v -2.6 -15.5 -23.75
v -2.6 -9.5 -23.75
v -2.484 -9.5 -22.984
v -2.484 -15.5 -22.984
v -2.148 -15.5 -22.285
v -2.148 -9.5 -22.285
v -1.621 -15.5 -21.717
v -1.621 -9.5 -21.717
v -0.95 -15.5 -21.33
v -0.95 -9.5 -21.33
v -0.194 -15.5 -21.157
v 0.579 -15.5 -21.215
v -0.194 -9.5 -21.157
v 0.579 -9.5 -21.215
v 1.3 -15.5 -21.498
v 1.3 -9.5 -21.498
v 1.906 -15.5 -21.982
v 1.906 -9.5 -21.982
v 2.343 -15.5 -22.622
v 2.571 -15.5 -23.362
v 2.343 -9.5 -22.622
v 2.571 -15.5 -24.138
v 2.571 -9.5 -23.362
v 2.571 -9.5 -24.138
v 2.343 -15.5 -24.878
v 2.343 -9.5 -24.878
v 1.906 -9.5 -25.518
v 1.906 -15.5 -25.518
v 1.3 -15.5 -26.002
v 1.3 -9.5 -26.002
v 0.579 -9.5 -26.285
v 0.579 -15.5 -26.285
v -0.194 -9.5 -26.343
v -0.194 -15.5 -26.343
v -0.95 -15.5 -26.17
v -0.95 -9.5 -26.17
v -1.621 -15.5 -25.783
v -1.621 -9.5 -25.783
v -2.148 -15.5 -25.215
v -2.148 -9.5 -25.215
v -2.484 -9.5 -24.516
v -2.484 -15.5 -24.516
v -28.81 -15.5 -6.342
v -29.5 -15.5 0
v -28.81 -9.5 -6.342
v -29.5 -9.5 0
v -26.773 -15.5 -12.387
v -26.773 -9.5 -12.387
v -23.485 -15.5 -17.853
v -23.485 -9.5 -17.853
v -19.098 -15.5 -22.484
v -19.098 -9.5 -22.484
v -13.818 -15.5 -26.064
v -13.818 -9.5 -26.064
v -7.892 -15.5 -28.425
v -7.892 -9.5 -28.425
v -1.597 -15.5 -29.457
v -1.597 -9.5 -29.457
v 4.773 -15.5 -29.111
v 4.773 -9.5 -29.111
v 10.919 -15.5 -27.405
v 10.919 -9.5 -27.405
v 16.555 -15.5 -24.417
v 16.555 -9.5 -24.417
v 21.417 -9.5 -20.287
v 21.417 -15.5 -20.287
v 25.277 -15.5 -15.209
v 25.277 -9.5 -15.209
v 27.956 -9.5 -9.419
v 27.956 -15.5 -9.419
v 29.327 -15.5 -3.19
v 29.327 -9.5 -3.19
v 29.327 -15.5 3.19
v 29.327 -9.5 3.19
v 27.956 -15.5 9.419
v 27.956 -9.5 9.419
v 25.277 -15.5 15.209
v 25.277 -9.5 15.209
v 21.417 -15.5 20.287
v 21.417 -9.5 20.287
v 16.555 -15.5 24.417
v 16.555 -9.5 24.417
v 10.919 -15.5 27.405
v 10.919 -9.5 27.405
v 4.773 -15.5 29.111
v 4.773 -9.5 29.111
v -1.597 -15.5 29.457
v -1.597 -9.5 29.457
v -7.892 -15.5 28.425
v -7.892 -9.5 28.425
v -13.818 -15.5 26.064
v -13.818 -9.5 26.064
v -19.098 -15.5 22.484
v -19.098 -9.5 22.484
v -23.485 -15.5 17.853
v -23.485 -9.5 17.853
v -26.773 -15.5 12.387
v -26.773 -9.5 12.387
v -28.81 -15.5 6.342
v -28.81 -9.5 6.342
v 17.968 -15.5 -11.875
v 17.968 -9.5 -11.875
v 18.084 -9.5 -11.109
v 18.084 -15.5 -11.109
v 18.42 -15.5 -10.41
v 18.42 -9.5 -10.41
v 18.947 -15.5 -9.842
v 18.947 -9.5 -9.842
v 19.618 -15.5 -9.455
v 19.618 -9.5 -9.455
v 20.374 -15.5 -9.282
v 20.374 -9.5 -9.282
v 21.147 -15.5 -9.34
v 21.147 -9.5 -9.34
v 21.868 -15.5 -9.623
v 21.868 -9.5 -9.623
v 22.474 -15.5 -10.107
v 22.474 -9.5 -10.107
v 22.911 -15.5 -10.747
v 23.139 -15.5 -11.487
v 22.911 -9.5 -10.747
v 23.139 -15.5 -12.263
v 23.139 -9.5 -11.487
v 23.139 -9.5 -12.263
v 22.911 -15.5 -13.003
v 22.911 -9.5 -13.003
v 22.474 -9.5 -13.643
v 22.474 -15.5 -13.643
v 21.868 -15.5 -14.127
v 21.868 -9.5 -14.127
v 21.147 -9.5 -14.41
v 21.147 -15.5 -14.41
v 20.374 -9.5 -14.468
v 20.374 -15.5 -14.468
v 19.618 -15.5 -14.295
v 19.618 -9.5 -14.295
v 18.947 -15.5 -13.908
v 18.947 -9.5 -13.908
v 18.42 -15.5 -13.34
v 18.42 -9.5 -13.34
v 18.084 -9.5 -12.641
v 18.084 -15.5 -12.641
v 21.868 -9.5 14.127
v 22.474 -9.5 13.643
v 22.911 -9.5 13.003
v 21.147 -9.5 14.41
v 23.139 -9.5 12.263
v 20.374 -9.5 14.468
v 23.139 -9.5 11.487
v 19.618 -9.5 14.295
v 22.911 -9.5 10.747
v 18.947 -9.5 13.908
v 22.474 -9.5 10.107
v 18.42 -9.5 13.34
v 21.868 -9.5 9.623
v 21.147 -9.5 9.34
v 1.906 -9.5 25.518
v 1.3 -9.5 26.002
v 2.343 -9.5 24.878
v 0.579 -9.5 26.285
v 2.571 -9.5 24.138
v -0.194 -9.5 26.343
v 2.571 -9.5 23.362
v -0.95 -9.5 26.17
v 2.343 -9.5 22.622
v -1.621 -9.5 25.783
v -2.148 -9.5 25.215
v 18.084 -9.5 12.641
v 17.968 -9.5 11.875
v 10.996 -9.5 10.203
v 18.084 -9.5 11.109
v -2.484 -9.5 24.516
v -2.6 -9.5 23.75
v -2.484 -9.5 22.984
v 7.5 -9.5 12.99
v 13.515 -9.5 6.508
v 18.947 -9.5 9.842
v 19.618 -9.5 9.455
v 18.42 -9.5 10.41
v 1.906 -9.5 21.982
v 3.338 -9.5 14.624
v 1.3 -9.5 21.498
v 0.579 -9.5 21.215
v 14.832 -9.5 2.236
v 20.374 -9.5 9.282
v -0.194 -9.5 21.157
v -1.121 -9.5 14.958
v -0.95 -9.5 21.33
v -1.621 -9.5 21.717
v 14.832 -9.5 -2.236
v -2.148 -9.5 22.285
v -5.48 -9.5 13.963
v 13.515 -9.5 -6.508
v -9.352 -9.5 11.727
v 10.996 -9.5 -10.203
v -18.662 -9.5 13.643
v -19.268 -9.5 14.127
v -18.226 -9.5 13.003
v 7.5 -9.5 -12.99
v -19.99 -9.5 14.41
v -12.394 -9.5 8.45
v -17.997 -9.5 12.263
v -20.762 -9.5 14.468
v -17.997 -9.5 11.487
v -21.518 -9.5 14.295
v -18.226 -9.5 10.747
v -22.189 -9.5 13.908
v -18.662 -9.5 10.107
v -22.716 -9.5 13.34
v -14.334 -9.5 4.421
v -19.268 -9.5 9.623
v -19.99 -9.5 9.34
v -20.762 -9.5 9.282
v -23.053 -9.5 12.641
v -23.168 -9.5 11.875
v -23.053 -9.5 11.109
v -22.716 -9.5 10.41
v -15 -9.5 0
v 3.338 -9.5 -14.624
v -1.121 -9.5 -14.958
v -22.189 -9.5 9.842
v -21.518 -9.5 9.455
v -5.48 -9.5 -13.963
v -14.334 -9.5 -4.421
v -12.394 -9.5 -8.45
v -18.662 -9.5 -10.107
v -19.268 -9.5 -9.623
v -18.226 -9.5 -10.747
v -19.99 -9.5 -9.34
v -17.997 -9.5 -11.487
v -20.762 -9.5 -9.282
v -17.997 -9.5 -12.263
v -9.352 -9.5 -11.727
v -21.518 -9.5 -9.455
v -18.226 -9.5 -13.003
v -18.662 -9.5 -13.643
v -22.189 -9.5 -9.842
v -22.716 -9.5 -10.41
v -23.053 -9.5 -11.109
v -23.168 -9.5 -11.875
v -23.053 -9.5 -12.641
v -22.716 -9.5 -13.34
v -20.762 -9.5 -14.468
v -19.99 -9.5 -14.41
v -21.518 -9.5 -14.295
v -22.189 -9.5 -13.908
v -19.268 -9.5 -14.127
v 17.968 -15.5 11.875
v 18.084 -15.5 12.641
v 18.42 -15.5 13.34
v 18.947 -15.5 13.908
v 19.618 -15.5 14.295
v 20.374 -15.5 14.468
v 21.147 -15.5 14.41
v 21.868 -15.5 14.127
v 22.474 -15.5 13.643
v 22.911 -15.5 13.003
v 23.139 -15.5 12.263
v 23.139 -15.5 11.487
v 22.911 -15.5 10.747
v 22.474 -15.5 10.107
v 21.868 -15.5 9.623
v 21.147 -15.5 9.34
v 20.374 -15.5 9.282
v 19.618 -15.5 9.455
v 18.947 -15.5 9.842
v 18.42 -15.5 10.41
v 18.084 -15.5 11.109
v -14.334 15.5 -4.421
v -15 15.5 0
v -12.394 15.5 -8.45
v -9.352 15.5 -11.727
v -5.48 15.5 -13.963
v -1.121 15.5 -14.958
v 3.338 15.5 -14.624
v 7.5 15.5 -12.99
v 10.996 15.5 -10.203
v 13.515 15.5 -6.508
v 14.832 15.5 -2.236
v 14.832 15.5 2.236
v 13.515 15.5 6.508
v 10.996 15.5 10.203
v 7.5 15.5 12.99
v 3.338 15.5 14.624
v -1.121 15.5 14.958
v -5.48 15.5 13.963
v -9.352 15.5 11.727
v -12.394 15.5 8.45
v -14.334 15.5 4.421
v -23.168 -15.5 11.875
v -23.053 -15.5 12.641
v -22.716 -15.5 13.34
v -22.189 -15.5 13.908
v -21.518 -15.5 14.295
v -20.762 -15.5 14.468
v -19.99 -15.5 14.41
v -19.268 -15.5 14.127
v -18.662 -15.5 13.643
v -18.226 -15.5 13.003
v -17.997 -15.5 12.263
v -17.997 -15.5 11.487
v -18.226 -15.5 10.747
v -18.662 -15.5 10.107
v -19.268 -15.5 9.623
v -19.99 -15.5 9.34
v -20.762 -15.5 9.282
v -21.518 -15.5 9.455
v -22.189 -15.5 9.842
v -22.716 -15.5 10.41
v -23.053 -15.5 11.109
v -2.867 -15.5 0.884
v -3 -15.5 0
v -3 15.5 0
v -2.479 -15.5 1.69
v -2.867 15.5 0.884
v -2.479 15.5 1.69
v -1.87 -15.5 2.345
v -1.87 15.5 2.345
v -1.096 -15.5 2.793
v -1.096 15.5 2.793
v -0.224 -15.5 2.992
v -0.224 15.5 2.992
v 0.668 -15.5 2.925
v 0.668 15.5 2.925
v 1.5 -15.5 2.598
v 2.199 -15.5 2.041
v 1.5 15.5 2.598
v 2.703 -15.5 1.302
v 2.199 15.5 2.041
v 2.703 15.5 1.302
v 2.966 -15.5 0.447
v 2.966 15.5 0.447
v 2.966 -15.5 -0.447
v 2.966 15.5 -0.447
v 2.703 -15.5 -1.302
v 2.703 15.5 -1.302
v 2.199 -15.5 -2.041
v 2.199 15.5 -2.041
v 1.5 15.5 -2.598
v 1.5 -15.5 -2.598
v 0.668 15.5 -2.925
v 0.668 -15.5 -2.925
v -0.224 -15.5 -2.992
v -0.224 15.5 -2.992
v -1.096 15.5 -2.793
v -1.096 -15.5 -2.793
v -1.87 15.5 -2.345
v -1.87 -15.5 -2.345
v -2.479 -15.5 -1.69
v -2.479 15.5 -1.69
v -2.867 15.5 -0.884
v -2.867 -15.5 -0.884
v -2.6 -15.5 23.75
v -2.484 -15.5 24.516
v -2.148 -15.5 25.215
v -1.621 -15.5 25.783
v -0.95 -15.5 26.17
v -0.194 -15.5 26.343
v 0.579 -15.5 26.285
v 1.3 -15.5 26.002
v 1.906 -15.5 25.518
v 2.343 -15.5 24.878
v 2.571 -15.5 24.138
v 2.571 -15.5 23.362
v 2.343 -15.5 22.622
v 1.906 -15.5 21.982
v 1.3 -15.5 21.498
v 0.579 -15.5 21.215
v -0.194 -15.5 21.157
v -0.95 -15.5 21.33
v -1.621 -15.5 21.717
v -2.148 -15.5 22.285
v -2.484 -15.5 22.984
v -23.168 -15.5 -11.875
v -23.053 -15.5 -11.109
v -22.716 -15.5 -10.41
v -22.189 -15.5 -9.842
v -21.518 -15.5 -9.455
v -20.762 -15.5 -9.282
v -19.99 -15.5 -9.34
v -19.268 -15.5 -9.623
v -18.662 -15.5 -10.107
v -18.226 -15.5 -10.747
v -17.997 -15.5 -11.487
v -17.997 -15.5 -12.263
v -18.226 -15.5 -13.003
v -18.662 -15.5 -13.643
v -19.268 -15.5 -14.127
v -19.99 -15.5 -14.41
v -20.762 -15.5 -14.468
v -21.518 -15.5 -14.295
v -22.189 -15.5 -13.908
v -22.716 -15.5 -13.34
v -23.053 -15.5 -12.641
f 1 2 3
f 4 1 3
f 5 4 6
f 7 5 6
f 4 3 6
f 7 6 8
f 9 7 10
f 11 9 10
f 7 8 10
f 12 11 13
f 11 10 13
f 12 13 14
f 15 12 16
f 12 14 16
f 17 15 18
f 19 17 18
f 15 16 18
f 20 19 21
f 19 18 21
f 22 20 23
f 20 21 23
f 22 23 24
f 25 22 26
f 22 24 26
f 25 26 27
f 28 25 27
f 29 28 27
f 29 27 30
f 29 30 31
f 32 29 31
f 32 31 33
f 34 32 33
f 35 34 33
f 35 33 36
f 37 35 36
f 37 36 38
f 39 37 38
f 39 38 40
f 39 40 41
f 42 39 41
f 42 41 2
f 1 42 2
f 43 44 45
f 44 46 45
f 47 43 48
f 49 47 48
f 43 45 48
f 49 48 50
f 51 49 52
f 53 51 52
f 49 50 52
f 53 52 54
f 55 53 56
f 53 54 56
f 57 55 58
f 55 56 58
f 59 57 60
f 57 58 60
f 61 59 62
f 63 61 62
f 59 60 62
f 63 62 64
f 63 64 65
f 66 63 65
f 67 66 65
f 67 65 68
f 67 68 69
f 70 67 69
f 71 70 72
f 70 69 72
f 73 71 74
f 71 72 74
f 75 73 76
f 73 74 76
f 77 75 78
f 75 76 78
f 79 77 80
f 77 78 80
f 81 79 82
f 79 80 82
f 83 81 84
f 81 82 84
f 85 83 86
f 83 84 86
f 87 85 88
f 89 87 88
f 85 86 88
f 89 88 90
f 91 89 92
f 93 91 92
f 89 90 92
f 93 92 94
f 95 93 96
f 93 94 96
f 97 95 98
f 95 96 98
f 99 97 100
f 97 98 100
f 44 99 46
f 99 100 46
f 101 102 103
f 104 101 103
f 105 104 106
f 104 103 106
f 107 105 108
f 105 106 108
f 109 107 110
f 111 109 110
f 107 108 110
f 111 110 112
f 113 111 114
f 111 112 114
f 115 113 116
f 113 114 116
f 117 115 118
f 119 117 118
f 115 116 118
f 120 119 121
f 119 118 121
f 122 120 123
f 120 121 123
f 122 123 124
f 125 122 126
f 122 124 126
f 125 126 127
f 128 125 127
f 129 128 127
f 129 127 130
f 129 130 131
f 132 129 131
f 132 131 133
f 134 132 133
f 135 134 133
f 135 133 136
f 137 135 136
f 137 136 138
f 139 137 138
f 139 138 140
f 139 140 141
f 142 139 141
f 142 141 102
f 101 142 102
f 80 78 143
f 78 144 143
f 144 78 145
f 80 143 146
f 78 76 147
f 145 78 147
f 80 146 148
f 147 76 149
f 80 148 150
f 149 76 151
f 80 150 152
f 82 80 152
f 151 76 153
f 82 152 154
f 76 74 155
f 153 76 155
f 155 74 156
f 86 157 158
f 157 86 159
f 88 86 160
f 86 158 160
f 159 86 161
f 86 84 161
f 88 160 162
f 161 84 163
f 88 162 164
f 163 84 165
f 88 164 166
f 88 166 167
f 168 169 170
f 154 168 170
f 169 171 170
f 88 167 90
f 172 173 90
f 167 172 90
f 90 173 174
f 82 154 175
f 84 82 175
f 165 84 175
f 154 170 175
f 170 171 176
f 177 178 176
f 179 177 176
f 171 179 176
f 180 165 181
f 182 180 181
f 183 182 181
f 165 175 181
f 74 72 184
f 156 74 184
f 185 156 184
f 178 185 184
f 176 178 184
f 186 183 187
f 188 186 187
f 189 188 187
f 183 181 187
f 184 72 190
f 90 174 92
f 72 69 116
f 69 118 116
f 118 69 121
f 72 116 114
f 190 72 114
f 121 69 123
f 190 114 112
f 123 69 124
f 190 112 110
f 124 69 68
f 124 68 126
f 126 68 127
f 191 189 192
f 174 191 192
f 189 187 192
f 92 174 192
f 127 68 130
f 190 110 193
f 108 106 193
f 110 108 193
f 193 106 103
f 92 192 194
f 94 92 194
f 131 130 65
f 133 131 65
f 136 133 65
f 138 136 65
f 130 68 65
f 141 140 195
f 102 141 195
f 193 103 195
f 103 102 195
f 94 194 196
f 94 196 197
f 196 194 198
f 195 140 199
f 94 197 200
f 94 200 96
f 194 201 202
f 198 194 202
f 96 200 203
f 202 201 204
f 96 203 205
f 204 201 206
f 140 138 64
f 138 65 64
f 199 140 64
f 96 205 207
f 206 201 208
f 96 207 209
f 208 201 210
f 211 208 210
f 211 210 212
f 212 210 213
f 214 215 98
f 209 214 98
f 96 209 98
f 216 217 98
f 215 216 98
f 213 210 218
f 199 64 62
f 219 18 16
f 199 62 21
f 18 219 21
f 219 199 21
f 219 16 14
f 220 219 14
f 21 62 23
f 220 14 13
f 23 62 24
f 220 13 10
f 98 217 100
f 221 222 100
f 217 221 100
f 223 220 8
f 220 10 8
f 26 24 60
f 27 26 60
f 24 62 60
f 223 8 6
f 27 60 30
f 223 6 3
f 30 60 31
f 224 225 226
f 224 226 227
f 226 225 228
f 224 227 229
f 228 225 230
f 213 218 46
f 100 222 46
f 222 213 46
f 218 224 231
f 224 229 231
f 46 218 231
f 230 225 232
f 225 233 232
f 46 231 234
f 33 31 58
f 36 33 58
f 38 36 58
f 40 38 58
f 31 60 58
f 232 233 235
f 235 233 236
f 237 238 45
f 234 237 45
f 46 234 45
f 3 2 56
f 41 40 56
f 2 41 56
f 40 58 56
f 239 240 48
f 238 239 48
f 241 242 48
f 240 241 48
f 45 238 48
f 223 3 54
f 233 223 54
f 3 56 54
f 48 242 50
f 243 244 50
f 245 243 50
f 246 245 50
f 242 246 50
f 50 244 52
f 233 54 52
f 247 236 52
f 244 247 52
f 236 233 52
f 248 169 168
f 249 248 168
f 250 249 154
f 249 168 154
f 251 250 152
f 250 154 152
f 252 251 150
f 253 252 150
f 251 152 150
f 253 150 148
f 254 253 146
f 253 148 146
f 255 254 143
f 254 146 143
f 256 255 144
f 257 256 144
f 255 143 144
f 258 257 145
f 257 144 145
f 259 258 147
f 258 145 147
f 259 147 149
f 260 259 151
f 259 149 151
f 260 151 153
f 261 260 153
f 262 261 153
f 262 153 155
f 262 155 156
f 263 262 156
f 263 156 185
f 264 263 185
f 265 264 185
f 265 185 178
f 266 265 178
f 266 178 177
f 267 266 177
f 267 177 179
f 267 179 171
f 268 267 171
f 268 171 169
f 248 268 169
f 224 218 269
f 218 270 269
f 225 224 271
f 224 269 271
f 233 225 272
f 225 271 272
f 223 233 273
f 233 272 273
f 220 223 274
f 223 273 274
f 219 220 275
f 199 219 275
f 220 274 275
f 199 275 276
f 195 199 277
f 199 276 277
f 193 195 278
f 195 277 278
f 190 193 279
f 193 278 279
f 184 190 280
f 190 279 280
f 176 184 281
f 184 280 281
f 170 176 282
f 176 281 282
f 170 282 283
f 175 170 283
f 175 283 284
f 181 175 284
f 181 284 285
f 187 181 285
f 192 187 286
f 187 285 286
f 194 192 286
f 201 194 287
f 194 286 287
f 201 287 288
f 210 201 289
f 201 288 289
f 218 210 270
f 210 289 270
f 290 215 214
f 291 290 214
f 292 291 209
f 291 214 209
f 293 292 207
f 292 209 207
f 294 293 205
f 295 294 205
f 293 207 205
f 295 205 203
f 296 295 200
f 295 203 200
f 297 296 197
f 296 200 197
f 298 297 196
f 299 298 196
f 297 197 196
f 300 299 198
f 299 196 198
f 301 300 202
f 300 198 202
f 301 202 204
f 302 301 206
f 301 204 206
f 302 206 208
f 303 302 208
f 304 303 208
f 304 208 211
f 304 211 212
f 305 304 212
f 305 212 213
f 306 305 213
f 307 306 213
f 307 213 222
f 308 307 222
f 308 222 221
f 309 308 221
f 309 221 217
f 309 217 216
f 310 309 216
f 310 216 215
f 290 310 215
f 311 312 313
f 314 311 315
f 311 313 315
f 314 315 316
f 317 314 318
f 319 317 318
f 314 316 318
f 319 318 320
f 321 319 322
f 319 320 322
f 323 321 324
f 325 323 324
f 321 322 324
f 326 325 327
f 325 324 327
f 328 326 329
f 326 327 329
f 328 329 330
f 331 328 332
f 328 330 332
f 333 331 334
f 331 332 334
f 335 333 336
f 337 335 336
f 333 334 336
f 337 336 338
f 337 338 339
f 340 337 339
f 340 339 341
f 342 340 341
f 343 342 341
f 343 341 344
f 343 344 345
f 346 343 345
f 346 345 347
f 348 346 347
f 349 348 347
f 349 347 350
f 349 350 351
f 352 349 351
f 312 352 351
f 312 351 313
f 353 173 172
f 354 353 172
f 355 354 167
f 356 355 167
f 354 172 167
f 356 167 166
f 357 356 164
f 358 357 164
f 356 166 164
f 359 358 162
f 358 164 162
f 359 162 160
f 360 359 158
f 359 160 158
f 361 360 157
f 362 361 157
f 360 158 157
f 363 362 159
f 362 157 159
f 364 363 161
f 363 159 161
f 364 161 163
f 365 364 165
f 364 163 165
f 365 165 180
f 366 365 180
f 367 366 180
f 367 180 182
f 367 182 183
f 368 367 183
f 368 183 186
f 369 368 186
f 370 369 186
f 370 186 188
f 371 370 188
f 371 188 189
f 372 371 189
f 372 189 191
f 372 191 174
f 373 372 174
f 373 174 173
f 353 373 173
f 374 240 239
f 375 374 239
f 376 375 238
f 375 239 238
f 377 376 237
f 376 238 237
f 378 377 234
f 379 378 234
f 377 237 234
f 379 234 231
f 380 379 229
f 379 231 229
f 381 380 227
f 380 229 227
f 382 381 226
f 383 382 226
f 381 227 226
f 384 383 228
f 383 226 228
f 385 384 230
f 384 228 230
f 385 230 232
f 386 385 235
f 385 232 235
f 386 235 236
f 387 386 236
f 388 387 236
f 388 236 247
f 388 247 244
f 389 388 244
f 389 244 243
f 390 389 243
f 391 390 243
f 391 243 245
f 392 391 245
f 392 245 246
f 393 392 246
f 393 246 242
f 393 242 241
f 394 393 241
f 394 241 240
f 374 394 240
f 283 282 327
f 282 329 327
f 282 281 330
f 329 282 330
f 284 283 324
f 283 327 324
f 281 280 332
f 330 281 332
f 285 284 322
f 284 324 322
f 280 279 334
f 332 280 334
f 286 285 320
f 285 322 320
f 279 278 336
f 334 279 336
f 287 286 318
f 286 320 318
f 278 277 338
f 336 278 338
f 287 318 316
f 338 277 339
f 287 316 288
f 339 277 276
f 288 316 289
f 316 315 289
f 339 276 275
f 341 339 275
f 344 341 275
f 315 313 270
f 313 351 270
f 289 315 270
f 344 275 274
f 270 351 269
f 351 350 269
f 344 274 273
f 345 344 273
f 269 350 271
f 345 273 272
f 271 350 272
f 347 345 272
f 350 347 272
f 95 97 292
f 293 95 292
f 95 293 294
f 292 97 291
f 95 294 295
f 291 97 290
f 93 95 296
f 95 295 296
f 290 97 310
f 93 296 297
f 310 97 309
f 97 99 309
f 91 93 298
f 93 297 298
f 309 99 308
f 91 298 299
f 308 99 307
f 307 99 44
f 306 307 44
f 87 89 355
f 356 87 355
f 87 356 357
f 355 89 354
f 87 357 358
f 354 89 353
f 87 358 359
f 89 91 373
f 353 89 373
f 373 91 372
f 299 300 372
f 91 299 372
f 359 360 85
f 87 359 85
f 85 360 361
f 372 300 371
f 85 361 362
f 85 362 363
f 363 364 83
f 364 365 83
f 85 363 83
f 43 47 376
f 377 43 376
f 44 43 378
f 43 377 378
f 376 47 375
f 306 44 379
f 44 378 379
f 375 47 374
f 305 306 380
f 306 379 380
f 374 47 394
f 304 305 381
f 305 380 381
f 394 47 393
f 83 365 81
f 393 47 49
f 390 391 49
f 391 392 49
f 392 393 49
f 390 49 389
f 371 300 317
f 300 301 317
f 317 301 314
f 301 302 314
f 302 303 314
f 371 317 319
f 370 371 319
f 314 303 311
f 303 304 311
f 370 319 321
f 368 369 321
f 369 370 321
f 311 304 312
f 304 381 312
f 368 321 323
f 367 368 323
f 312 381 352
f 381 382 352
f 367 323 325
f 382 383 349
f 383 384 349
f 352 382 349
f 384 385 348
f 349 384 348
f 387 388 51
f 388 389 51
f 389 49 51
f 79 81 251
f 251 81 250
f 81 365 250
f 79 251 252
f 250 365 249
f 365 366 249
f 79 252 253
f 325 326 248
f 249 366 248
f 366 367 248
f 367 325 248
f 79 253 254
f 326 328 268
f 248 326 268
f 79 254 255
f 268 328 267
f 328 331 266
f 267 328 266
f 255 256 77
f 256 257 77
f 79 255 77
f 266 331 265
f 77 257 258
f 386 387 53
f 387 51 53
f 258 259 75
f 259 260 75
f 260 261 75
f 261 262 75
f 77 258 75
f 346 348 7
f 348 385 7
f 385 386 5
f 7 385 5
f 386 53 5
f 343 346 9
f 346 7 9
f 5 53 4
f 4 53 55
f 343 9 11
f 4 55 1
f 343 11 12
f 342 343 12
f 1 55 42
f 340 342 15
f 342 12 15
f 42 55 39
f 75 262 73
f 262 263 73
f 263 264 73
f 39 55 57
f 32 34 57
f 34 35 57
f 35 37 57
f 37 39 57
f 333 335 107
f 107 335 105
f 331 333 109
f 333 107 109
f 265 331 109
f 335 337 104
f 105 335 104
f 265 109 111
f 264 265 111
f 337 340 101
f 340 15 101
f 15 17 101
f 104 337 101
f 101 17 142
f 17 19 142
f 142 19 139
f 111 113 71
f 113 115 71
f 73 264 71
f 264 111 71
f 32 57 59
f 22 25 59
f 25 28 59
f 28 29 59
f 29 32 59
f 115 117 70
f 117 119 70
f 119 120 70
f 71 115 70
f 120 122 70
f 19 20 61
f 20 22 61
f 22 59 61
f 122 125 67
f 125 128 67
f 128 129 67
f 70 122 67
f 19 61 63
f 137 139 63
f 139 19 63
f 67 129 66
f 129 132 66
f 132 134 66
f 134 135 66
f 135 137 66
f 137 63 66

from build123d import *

# Parameters (mm, degrees)
CUT_EXTRUDE1_REACH = 53.976
SKETCH2_R          = 3
SKETCH2_R_2        = 2.6


with BuildPart() as part:
    # Sketch1 → Revolve1 (revolve)
    with BuildSketch(Plane.XY, mode=Mode.PRIVATE) as revolve1_sk:
        Polygon((0, -15.5), (29.5, -15.5), (29.5, -9.5), (15, -9.5), (15, 15.5), (0, 15.5), align=None)
    revolve(revolve1_sk.sketch.rotate(Axis((0, 0, 0), (0, -1, 0)), 180), axis=Axis((0, 0, 0), (0, -1, 0)))

    # Sketch2 → Cut-Extrude1 (cut, up to next)
    with BuildSketch(Plane(origin=(0, 15.5, 0), x_dir=(1, 0, 0), z_dir=(0, 1, 0)), mode=Mode.PRIVATE) as cut_extrude1_sk1:
        with Locations(Location((0, 0, 0), (0, 0, 180))):
            Circle(SKETCH2_R)
    cut_extrude1_tool1 = extrude(cut_extrude1_sk1.sketch, amount=-CUT_EXTRUDE1_REACH, mode=Mode.PRIVATE) & part.part
    # Sketch2 → Cut-Extrude1 (cut, up to next)
    with BuildSketch(Plane(origin=(0, 15.5, 0), x_dir=(1, 0, 0), z_dir=(0, 1, 0)), mode=Mode.PRIVATE) as cut_extrude1_sk2:
        with Locations(Location((0, 23.75, 0), (0, 0, 180))):
            Circle(SKETCH2_R_2)
    cut_extrude1_tool2 = extrude(cut_extrude1_sk2.sketch, amount=-CUT_EXTRUDE1_REACH, mode=Mode.PRIVATE) & part.part
    # Sketch2 → Cut-Extrude1 (cut, up to next)
    with BuildSketch(Plane(origin=(0, 15.5, 0), x_dir=(1, 0, 0), z_dir=(0, 1, 0)), mode=Mode.PRIVATE) as cut_extrude1_sk3:
        with Locations(Location((20.56810334, 11.875, 0), (0, 0, 180))):
            Circle(SKETCH2_R_2)
    cut_extrude1_tool3 = extrude(cut_extrude1_sk3.sketch, amount=-CUT_EXTRUDE1_REACH, mode=Mode.PRIVATE) & part.part
    # Sketch2 → Cut-Extrude1 (cut, up to next)
    with BuildSketch(Plane(origin=(0, 15.5, 0), x_dir=(1, 0, 0), z_dir=(0, 1, 0)), mode=Mode.PRIVATE) as cut_extrude1_sk4:
        with Locations(Location((20.56810334, -11.875, 0), (0, 0, 180))):
            Circle(SKETCH2_R_2)
    cut_extrude1_tool4 = extrude(cut_extrude1_sk4.sketch, amount=-CUT_EXTRUDE1_REACH, mode=Mode.PRIVATE) & part.part
    # Sketch2 → Cut-Extrude1 (cut, up to next)
    with BuildSketch(Plane(origin=(0, 15.5, 0), x_dir=(1, 0, 0), z_dir=(0, 1, 0)), mode=Mode.PRIVATE) as cut_extrude1_sk5:
        with Locations(Location((0, -23.75, 0), (0, 0, 180))):
            Circle(SKETCH2_R_2)
    cut_extrude1_tool5 = extrude(cut_extrude1_sk5.sketch, amount=-CUT_EXTRUDE1_REACH, mode=Mode.PRIVATE) & part.part
    # Sketch2 → Cut-Extrude1 (cut, up to next)
    with BuildSketch(Plane(origin=(0, 15.5, 0), x_dir=(1, 0, 0), z_dir=(0, 1, 0)), mode=Mode.PRIVATE) as cut_extrude1_sk6:
        with Locations(Location((-20.56810334, -11.875, 0), (0, 0, 180))):
            Circle(SKETCH2_R_2)
    cut_extrude1_tool6 = extrude(cut_extrude1_sk6.sketch, amount=-CUT_EXTRUDE1_REACH, mode=Mode.PRIVATE) & part.part
    # Sketch2 → Cut-Extrude1 (cut, up to next)
    with BuildSketch(Plane(origin=(0, 15.5, 0), x_dir=(1, 0, 0), z_dir=(0, 1, 0)), mode=Mode.PRIVATE) as cut_extrude1_sk7:
        with Locations(Location((-20.56810334, 11.875, 0), (0, 0, 180))):
            Circle(SKETCH2_R_2)
    cut_extrude1_tool7 = extrude(cut_extrude1_sk7.sketch, amount=-CUT_EXTRUDE1_REACH, mode=Mode.PRIVATE) & part.part
    add(cut_extrude1_tool1.solids().sort_by_distance((0, 15.5, 0))[0], mode=Mode.SUBTRACT)
    add(cut_extrude1_tool2.solids().sort_by_distance((0, 15.5, -23.75))[0], mode=Mode.SUBTRACT)
    add(cut_extrude1_tool3.solids().sort_by_distance((20.568103, 15.5, -11.875))[0], mode=Mode.SUBTRACT)
    add(cut_extrude1_tool4.solids().sort_by_distance((20.568103, 15.5, 11.875))[0], mode=Mode.SUBTRACT)
    add(cut_extrude1_tool5.solids().sort_by_distance((0, 15.5, 23.75))[0], mode=Mode.SUBTRACT)
    add(cut_extrude1_tool6.solids().sort_by_distance((-20.568103, 15.5, 11.875))[0], mode=Mode.SUBTRACT)
    add(cut_extrude1_tool7.solids().sort_by_distance((-20.568103, 15.5, -11.875))[0], mode=Mode.SUBTRACT)


solid = part.part
